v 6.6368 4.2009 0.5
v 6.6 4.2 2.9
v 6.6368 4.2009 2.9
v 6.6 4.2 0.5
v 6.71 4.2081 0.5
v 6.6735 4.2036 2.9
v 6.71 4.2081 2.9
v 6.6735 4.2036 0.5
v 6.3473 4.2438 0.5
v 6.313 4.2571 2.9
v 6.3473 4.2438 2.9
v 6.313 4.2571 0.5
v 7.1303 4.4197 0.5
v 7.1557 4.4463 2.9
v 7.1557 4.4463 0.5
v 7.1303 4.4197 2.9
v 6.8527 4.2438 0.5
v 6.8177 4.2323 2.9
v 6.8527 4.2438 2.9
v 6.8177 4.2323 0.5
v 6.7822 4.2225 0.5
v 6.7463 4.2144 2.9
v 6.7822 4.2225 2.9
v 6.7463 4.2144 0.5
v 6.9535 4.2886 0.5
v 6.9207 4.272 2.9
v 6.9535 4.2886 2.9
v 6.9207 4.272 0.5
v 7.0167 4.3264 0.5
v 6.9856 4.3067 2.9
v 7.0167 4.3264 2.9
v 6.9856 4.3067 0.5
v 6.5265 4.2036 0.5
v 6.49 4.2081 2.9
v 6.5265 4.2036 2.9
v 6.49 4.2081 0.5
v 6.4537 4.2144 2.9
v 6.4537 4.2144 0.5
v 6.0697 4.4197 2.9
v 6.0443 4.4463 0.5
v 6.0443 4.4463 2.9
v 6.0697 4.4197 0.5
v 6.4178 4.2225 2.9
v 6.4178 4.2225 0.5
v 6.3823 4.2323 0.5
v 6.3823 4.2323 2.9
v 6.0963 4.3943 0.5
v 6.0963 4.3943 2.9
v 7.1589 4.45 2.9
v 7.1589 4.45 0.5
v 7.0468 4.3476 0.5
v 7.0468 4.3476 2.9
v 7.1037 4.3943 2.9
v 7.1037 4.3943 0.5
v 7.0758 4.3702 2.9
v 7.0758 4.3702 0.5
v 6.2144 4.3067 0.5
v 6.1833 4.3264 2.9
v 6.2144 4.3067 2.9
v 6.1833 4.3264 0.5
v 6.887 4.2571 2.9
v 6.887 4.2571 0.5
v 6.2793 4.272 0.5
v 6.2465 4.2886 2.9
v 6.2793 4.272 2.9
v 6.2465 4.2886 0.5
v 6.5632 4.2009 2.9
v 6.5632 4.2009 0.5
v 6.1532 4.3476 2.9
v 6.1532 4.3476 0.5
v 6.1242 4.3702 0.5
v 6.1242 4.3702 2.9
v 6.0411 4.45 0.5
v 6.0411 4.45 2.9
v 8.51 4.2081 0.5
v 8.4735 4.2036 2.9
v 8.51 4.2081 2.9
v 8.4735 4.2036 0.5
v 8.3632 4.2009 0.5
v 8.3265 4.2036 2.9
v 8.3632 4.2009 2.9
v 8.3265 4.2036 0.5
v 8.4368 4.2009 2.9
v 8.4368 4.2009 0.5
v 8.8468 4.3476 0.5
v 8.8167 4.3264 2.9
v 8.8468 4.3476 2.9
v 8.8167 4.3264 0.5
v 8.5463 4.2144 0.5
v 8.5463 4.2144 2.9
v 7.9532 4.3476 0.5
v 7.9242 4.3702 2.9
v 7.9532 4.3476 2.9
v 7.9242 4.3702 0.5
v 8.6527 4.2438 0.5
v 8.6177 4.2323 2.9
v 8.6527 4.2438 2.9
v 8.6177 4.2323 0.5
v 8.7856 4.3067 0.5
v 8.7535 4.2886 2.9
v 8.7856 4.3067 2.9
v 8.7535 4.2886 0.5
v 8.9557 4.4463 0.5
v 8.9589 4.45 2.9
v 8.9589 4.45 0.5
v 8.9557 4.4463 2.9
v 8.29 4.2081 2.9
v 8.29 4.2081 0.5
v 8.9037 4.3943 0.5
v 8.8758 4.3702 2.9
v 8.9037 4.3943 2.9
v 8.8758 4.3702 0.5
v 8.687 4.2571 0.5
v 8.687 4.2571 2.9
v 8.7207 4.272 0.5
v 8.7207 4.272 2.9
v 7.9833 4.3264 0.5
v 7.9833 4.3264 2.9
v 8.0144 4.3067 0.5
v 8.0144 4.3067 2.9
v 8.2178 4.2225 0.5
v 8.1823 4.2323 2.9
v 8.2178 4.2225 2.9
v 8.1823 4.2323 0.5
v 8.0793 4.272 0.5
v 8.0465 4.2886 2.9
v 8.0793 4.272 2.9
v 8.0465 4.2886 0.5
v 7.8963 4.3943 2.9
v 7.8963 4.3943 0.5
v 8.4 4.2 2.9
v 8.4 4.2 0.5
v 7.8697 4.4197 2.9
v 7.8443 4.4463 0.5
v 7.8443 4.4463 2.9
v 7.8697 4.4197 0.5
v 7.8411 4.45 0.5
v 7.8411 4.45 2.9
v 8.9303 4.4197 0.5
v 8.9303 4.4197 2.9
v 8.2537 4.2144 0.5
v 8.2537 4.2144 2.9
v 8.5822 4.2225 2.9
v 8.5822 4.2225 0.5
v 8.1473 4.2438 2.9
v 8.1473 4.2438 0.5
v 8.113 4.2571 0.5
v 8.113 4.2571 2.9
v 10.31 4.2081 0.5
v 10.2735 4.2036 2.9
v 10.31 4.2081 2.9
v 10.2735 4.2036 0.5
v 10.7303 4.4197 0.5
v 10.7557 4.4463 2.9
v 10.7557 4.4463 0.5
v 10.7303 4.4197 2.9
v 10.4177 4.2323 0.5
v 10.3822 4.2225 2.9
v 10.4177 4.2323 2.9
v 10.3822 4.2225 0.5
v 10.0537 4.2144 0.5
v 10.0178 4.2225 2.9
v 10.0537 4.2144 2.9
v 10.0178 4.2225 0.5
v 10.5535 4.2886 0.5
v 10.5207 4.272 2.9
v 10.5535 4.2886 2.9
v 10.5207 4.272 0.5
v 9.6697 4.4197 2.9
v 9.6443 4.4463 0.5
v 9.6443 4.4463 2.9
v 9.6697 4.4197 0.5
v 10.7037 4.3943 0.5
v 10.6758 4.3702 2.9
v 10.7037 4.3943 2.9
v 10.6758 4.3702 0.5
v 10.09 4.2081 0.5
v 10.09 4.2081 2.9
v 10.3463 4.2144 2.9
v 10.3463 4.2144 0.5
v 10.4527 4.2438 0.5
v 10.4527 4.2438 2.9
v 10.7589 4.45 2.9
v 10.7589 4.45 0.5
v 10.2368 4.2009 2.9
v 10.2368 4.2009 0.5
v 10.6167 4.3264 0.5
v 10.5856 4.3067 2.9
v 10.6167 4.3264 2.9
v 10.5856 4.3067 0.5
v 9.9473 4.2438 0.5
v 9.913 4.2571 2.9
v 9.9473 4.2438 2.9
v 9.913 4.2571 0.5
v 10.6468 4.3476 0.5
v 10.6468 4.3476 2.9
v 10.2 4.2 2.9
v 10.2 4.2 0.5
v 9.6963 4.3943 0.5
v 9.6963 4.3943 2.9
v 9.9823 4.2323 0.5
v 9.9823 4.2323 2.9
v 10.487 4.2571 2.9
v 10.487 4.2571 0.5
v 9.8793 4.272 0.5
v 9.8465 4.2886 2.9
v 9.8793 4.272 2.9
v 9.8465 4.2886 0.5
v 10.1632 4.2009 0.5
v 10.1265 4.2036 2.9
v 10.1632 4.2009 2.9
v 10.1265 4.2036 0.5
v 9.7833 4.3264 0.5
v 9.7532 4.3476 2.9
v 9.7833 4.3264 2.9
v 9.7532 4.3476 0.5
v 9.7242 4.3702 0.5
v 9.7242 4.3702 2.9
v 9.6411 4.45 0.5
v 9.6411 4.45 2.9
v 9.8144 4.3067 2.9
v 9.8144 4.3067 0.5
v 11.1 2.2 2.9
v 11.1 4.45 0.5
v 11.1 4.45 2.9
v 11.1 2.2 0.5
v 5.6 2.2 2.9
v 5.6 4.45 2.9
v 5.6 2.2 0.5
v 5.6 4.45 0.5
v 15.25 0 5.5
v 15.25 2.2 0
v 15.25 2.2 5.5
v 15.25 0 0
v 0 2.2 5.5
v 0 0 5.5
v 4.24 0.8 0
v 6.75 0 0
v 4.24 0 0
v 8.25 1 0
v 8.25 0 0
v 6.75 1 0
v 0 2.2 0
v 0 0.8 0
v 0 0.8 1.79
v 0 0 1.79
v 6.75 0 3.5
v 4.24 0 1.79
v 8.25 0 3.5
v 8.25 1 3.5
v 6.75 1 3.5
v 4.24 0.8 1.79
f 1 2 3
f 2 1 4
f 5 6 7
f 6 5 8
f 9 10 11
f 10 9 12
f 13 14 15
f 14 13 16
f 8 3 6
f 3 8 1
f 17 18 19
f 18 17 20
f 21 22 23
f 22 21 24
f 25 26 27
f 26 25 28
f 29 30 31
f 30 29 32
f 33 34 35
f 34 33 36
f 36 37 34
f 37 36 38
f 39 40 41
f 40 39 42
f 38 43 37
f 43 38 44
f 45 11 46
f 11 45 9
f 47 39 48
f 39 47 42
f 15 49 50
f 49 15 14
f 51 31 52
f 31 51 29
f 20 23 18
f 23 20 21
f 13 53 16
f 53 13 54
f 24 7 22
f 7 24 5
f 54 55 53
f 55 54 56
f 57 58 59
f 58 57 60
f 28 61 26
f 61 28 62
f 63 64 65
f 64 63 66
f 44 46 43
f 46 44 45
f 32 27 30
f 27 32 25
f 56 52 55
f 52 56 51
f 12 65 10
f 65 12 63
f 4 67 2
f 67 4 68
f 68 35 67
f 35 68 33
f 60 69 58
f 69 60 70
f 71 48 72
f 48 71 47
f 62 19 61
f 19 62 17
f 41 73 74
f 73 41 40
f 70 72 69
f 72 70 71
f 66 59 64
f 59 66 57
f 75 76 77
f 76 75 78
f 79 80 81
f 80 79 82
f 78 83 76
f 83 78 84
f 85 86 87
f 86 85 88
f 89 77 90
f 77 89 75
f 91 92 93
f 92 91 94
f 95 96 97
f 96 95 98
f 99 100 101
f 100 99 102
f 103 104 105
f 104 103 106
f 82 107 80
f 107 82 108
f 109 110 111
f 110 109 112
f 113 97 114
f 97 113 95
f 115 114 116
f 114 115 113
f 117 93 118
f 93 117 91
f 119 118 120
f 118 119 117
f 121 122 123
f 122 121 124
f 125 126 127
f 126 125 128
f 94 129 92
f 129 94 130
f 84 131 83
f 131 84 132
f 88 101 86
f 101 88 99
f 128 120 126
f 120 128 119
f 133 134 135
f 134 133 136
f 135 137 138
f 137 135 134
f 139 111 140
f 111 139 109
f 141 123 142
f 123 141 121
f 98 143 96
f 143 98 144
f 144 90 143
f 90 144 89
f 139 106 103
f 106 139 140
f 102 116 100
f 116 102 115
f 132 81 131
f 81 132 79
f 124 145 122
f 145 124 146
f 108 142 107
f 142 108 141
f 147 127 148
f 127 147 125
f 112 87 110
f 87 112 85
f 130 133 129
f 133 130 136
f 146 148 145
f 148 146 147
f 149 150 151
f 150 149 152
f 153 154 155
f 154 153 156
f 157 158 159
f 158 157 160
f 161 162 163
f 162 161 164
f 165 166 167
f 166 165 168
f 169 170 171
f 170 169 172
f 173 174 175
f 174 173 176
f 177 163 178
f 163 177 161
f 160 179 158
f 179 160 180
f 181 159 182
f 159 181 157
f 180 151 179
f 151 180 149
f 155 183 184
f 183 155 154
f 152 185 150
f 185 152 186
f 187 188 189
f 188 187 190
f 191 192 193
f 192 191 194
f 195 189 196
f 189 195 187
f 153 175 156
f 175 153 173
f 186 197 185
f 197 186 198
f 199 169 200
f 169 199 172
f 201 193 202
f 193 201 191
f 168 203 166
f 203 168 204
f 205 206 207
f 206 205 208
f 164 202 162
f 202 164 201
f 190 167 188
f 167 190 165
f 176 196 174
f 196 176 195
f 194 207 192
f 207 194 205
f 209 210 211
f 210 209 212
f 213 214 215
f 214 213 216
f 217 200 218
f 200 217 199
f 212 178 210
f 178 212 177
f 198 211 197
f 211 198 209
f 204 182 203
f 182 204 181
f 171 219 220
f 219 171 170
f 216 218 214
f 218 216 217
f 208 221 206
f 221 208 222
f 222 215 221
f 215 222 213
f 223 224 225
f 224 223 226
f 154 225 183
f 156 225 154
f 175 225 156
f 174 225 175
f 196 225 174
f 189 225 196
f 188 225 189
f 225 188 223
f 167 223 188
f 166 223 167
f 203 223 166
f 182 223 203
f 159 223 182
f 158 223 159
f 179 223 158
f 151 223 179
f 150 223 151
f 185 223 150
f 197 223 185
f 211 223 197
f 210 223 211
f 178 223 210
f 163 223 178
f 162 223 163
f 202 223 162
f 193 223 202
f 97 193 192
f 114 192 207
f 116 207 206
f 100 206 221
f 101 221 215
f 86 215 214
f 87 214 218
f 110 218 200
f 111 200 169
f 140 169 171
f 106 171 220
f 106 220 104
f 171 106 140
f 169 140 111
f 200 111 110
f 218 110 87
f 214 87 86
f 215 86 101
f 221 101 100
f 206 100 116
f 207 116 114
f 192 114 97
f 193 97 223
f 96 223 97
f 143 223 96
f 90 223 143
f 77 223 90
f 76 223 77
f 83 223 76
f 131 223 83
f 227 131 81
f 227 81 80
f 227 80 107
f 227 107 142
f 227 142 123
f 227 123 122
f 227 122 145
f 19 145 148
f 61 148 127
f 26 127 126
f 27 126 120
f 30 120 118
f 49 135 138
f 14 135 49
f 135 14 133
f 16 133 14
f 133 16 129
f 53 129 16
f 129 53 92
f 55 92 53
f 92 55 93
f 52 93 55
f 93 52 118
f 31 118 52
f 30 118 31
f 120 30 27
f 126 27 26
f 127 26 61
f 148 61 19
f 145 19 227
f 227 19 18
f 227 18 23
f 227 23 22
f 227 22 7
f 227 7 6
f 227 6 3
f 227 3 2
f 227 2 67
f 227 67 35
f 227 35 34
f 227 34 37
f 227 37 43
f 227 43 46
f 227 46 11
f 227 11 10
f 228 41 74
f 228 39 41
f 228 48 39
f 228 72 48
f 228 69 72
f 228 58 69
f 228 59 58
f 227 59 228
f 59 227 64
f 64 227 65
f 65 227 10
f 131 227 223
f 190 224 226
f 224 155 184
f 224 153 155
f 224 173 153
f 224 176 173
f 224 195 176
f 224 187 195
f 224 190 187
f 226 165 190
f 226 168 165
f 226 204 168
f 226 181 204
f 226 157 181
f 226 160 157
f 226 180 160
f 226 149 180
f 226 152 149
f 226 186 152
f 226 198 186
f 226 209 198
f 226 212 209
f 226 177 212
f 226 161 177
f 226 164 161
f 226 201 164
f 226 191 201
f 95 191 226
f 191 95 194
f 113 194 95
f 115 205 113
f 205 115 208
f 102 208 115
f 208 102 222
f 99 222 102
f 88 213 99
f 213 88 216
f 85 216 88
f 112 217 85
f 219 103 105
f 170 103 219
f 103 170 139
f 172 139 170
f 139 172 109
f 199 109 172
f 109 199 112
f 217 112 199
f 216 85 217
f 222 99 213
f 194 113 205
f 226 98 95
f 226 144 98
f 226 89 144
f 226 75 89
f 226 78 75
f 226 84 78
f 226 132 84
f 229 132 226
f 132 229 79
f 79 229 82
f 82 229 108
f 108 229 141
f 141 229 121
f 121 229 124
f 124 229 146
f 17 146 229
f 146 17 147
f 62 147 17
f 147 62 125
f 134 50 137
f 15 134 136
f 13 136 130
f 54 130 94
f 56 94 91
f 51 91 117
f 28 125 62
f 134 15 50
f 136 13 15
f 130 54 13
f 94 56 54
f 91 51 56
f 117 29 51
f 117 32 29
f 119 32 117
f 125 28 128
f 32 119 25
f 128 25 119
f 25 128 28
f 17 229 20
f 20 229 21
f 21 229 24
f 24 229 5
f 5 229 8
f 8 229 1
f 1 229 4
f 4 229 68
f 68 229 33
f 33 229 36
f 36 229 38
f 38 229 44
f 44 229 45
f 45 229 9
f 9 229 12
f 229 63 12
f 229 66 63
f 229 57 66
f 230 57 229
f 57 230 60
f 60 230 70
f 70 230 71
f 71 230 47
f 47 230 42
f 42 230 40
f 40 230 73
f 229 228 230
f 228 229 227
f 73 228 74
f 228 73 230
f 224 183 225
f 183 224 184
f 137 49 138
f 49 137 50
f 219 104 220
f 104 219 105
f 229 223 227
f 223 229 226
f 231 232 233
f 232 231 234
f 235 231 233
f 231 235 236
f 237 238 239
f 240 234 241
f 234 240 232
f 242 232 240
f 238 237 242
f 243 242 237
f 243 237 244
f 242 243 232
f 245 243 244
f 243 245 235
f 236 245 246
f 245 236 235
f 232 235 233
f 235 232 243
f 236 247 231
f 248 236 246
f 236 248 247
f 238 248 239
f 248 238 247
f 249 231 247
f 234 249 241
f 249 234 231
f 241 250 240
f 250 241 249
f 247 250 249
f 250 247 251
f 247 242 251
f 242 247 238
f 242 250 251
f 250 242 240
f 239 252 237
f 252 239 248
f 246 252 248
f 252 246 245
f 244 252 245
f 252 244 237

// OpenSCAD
module switch_cover() {

BW_ON = 4;
BWM = 8;
BW_OFF = 3.25;
BH = 5.5;
BD = 1.6 + 0.6;

DX_BUMP = 5.6;
DZ_BUMP = 0.5;
W_BUMP = 5.5;
H_BUMP = 2.4;
D_BUMP = 2.25;

DX_SLOT = 4.75 + 2;
W_SLOT = 1.5;
D_SLOT = 1.;
H_SLOT = 3.5;

difference() {
    union() {
        cube([BW_ON + BWM + BW_OFF, BD, BH]);
        translate([DX_BUMP, BD, DZ_BUMP]) difference() {
            cube([W_BUMP, D_BUMP, H_BUMP]);
            for(i = [0, 1, 2]) {
                translate([i * 1.8 + 1, D_BUMP + 0.5, -1])
                    cylinder(h=H_BUMP + 2, r=0.75);
            }
        }
    }

    translate([DX_SLOT, -1, -1])
        cube([W_SLOT, D_SLOT + 1, H_SLOT + 1]);

    translate([-0.01, BD - 1.4, -0.01]) mirror([0, 1, 0])
        cube([BW_OFF + 1, 2, 1.8]);
}

}

switch_cover();

$fn = 128;
